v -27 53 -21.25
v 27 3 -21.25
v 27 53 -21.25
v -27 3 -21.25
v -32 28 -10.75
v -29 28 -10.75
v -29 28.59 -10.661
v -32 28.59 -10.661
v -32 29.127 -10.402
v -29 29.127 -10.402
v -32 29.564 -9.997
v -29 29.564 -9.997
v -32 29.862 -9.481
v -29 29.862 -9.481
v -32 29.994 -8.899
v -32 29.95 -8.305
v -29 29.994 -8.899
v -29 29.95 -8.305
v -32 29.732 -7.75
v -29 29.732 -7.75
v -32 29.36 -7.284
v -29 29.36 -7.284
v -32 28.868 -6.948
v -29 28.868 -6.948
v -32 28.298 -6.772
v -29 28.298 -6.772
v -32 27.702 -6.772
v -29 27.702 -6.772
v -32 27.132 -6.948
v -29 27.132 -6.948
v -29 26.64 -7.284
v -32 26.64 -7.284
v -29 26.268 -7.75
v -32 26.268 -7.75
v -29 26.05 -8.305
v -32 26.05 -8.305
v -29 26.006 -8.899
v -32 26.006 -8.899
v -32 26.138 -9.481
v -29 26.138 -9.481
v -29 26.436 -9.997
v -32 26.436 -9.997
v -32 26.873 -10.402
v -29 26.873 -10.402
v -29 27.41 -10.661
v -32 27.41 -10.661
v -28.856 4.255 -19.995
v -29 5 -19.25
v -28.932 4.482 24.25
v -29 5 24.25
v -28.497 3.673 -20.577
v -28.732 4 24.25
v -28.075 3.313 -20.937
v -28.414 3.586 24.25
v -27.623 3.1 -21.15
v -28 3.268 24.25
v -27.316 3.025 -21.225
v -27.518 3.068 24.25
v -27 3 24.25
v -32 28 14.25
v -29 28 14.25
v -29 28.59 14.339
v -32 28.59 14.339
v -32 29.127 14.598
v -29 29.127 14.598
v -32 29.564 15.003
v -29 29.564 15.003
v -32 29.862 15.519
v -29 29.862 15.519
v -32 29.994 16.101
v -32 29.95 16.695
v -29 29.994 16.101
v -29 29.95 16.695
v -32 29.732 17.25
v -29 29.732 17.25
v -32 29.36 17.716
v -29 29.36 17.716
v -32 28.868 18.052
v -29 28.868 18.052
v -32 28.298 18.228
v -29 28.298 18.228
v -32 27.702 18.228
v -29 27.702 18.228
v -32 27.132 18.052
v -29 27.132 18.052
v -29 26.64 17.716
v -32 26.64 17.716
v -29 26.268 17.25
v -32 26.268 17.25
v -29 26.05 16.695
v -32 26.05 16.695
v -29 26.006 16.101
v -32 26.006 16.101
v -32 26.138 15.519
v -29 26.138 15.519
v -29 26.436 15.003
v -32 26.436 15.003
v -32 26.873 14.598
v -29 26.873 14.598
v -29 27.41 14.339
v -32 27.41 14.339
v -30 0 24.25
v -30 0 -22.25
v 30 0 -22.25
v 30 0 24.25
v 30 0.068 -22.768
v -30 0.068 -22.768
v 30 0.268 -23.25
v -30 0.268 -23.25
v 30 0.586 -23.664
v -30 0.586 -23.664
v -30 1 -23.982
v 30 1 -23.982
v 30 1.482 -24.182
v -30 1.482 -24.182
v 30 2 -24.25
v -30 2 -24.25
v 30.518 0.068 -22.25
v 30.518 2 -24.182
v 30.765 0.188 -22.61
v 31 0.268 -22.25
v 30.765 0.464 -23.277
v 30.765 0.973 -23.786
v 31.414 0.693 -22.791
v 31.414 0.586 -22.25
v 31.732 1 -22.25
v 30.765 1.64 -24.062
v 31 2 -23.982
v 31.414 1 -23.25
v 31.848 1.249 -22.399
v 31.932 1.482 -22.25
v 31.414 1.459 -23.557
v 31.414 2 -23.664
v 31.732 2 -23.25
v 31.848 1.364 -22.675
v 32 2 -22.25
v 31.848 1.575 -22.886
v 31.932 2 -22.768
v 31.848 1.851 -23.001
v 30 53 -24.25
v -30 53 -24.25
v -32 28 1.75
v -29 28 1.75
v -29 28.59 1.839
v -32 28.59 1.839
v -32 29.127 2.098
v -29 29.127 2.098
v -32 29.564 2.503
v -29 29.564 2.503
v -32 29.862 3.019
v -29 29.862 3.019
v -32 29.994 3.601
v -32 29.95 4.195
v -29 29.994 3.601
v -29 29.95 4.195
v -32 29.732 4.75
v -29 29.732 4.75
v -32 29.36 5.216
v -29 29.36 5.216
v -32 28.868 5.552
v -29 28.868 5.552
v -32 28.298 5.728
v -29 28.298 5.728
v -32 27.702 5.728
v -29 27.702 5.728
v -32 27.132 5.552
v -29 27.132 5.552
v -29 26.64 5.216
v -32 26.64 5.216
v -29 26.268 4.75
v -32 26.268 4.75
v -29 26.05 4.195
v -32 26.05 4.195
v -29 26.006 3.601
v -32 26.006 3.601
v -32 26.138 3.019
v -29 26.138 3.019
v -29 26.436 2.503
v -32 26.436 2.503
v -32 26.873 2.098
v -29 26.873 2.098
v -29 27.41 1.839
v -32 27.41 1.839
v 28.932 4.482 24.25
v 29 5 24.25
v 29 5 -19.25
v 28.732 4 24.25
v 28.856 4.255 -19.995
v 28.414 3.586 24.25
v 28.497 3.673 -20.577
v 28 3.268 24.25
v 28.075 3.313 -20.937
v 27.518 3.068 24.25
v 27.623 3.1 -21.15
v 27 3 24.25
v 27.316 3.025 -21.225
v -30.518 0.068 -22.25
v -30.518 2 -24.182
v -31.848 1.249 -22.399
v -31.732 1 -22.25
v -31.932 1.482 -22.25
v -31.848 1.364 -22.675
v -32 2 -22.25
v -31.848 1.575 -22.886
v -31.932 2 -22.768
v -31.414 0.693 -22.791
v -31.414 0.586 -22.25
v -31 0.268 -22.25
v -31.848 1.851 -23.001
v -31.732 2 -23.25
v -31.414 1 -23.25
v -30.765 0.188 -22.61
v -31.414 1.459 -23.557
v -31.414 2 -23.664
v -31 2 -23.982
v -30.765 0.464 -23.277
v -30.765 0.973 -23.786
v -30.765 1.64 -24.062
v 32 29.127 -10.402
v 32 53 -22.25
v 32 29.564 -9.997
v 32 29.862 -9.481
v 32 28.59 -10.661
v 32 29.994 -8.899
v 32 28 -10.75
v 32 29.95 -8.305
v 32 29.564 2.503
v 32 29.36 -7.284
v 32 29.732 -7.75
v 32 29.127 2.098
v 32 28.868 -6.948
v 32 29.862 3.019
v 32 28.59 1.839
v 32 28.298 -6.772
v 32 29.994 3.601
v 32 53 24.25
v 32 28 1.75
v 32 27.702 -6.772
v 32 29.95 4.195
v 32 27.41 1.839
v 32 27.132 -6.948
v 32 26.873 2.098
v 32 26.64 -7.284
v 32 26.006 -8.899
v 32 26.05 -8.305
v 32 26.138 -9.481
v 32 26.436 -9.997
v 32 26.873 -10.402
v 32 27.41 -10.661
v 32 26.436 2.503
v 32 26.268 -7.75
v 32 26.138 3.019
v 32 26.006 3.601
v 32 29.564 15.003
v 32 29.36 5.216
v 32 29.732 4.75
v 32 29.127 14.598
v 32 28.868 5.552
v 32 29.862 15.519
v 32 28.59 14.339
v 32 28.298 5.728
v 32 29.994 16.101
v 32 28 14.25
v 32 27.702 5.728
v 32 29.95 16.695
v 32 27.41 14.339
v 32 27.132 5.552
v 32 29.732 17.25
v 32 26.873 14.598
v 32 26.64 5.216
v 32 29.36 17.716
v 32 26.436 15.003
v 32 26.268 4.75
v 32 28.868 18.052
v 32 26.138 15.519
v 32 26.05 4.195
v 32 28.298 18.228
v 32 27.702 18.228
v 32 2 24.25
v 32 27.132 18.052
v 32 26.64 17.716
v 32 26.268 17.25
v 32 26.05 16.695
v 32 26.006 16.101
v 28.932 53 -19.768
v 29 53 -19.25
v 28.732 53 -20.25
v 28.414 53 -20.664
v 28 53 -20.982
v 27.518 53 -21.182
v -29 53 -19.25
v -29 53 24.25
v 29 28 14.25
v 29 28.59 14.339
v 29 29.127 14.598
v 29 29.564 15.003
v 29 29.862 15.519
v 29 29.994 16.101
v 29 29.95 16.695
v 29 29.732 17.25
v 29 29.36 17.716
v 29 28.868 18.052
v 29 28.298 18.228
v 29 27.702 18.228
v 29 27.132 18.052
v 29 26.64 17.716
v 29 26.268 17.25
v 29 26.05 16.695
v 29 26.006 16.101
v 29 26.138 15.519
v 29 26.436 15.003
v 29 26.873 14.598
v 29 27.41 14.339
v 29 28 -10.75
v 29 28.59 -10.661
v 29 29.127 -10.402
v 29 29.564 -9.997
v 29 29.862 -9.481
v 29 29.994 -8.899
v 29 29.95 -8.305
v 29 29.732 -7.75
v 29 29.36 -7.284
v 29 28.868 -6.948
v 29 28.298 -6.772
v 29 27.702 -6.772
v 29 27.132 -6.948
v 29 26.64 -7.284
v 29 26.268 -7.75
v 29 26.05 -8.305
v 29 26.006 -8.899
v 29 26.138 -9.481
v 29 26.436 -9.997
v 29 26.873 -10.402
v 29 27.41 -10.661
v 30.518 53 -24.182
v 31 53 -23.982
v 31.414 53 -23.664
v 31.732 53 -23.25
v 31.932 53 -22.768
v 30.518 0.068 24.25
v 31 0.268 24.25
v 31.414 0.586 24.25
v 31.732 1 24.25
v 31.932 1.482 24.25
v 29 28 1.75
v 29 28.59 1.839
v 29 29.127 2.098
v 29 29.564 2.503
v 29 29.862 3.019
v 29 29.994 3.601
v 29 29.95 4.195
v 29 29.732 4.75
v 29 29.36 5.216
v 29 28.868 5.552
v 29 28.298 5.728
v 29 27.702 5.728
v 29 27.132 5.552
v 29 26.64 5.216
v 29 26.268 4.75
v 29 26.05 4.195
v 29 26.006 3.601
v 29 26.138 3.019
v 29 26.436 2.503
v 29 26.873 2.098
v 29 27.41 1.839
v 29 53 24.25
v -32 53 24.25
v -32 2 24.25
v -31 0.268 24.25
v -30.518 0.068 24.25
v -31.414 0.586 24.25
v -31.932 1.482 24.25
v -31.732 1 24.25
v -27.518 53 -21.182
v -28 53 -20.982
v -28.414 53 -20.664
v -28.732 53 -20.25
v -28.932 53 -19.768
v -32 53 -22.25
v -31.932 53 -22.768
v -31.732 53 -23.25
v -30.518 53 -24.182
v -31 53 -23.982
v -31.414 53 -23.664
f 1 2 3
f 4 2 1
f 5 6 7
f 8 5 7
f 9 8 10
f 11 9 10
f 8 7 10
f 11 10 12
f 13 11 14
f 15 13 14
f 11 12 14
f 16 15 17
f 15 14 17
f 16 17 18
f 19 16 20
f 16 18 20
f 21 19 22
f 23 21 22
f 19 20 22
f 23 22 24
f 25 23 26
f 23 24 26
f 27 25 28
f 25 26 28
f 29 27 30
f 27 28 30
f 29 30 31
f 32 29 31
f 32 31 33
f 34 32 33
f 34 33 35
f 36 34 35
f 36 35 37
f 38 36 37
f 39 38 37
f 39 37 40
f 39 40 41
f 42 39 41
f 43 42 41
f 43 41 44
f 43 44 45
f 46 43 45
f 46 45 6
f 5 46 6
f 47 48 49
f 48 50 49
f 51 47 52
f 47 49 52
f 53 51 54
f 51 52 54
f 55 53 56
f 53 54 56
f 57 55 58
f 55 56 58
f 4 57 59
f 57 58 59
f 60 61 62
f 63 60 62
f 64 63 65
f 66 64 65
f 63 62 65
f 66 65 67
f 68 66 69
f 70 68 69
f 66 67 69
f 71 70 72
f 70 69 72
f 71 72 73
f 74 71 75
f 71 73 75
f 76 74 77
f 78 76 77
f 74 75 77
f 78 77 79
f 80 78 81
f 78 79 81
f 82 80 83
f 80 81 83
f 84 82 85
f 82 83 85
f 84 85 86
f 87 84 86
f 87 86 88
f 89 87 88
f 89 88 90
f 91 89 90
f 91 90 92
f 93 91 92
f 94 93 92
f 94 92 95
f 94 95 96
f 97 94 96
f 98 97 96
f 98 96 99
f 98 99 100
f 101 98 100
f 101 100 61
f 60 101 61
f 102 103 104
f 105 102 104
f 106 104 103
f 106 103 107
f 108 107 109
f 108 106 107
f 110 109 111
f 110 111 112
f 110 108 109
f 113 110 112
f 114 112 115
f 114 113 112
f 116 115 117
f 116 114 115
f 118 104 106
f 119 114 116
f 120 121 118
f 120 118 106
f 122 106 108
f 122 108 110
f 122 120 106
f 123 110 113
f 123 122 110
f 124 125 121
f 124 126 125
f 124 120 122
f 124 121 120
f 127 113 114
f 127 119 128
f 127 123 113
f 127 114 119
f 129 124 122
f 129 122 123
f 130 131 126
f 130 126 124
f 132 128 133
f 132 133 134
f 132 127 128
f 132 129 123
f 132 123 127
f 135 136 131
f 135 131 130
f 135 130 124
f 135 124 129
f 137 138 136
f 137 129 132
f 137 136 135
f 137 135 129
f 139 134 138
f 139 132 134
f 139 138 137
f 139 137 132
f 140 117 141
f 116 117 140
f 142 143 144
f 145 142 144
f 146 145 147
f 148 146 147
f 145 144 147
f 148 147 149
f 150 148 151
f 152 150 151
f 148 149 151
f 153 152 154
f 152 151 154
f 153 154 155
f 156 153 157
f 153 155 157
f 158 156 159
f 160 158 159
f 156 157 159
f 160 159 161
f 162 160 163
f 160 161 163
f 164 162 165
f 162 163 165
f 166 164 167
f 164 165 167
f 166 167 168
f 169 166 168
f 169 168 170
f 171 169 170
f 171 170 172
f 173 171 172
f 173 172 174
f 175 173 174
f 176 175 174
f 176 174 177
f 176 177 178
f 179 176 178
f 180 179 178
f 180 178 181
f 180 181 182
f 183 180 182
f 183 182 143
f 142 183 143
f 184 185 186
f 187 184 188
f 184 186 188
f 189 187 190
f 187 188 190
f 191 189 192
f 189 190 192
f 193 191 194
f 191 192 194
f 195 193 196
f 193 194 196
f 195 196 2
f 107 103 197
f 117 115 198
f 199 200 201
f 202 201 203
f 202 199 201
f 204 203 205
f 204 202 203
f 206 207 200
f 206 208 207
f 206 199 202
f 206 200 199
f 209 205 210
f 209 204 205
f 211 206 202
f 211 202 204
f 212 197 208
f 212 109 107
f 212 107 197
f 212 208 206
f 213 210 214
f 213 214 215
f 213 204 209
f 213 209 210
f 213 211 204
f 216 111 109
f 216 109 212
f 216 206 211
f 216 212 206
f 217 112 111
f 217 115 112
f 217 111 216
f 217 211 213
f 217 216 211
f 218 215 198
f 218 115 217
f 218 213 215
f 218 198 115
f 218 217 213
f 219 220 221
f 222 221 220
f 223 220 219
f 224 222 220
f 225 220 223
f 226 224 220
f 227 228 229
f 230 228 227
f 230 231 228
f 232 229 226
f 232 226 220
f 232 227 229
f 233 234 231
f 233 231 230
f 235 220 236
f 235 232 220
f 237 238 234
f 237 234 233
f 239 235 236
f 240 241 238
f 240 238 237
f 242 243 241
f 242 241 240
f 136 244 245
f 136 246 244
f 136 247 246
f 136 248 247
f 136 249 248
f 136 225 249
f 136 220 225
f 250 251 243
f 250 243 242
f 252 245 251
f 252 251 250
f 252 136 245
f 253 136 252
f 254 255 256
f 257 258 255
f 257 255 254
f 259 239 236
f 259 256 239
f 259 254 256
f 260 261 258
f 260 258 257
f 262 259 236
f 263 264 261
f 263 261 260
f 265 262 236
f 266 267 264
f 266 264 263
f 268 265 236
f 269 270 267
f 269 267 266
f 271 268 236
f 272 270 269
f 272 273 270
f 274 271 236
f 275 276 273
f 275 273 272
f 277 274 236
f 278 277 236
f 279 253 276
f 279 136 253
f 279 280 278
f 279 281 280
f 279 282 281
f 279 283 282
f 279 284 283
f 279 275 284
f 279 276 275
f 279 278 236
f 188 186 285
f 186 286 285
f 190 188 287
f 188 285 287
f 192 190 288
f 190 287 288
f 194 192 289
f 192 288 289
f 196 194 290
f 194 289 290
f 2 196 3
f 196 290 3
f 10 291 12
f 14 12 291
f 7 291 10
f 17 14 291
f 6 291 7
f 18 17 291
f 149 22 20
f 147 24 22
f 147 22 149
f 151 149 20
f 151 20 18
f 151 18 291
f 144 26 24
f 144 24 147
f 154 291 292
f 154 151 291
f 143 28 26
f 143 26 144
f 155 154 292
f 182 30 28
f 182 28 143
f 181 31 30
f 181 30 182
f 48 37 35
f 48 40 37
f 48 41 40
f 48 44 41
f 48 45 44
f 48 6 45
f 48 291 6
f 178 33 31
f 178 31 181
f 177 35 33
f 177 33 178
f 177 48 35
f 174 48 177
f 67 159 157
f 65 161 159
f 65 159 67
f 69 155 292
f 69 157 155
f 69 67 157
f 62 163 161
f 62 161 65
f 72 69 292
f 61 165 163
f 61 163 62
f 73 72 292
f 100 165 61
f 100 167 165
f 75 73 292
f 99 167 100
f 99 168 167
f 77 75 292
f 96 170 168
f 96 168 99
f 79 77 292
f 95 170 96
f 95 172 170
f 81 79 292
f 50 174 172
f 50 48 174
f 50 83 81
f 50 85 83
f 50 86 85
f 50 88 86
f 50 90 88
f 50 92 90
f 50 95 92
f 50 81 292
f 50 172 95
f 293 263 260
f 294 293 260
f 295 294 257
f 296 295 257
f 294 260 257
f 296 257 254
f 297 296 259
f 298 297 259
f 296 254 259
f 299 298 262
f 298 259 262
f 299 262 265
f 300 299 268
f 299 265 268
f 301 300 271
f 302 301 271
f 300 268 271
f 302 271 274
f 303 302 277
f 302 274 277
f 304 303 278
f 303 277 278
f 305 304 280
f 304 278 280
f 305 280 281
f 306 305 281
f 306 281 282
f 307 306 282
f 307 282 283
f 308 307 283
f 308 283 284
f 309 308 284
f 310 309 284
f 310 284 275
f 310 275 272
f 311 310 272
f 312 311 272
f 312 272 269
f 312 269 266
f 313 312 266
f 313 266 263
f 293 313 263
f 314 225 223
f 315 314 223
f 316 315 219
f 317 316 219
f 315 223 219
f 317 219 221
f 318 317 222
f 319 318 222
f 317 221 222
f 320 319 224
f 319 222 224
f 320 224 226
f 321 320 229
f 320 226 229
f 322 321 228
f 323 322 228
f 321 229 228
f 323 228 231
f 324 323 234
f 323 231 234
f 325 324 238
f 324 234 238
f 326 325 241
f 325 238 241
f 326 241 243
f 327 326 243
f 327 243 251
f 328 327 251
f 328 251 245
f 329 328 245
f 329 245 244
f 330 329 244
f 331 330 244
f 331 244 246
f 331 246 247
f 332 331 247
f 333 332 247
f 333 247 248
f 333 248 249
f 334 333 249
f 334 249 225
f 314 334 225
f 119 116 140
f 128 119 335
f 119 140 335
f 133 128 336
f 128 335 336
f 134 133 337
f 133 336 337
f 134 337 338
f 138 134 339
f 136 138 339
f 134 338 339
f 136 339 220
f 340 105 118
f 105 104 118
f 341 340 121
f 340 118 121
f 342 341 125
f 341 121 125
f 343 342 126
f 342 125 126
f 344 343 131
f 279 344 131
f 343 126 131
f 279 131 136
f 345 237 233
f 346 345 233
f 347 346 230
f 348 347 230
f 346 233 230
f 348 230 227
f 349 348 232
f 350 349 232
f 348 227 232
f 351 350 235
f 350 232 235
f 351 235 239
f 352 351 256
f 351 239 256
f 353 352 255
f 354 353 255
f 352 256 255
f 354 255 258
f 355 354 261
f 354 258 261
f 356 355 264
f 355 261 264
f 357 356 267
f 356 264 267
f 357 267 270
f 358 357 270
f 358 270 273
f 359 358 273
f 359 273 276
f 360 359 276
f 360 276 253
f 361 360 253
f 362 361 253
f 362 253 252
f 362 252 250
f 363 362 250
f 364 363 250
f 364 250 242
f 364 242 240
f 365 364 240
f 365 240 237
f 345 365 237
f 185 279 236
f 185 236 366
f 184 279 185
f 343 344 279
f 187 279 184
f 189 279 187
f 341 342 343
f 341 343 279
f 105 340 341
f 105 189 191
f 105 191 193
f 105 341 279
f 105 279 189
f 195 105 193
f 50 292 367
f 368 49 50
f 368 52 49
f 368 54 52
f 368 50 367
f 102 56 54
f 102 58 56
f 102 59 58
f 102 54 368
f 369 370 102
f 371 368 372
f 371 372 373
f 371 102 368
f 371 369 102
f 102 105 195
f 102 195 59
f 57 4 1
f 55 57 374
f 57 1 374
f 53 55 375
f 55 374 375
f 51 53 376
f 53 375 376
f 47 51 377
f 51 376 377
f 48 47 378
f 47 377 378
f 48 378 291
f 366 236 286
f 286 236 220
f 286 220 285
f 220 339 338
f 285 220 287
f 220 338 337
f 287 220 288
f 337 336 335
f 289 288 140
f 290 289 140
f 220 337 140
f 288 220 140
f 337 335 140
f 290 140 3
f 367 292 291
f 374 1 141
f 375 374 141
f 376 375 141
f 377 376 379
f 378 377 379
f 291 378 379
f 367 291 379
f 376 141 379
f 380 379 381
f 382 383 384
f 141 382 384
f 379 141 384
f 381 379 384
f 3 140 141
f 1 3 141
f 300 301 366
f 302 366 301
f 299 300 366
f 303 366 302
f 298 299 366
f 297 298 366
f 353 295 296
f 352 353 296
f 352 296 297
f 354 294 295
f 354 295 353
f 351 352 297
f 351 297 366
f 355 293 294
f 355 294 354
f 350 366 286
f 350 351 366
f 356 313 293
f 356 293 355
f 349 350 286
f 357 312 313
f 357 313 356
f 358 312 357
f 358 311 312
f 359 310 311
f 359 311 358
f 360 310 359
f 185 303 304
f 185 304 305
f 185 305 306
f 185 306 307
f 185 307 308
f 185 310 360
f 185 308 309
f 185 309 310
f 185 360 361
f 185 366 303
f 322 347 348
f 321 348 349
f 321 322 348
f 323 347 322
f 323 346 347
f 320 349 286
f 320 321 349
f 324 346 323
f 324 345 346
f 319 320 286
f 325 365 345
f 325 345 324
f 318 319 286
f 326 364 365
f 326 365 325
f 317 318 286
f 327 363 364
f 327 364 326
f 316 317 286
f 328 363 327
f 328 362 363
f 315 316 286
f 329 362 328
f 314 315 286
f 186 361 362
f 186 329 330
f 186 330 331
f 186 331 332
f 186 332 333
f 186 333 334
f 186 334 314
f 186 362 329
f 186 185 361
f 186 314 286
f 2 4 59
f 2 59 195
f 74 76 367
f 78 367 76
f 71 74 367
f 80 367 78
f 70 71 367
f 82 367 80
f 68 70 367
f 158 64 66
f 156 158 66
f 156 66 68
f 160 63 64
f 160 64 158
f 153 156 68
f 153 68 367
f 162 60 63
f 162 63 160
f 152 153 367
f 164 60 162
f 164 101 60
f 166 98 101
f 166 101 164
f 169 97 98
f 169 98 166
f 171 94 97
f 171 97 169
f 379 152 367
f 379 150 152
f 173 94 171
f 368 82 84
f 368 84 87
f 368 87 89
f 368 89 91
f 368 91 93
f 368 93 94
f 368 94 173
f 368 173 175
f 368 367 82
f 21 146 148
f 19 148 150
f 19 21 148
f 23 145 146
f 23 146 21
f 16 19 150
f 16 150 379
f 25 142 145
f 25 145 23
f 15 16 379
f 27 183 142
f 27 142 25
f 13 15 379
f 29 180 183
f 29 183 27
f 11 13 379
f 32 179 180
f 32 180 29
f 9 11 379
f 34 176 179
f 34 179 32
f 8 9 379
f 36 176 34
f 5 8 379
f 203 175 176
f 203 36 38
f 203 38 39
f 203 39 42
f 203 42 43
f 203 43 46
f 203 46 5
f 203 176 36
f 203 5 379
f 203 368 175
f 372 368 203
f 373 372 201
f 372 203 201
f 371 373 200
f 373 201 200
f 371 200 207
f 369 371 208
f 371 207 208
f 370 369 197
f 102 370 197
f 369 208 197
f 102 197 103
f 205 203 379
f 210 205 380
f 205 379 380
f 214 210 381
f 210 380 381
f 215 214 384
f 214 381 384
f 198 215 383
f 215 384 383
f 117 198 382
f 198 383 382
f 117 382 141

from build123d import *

# Parameters (mm, degrees)
SKETCH_1_W          = 64
SKETCH_1_H          = 48.5
EXTRUDE_1_DEPTH     = 3
EXTRUDE_2_DEPTH     = 50
FILLET_2_R          = 2
SKETCH_3_R          = 2
CUT_EXTRUDE_1_DEPTH = 65
FILLET_3_R          = 2


with BuildPart() as part:
    # Эскиз1 → Бобышка-Вытянуть1 (new body)
    with BuildSketch(Plane(origin=(0, 0, 0), x_dir=(1, 0, 0), z_dir=(0, 1, 0))):
        Rectangle(SKETCH_1_W, SKETCH_1_H)
    extrude(amount=EXTRUDE_1_DEPTH)

    # Эскиз2 → Бобышка-Вытянуть2 (add)
    with BuildSketch(Plane(origin=(0, 3, 0), x_dir=(1, 0, 0), z_dir=(0, 1, 0))):
        Polygon((-32, -24.25), (-32, 24.25), (32, 24.25), (32, -24.25), (29, -24.25), (29, 21.25), (-29, 21.25), (-29, -24.25), align=None)
    extrude(amount=EXTRUDE_2_DEPTH)

    # Скругление2
    fillet_2_edges = [part.edges().sort_by_distance(p)[0] for p in [
        (0, 0, -24.25),
    ]]
    fillet(fillet_2_edges, radius=FILLET_2_R)

    # Эскиз3 → Вырез-Вытянуть1 (cut, through all)
    with BuildSketch(Plane(origin=(32, 0, 0), x_dir=(0, 0, -1), z_dir=(1, 0, 0))):
        with Locations((8.75, 28)):
            Circle(SKETCH_3_R)
        with Locations((-3.75, 28)):
            Circle(SKETCH_3_R)
        with Locations((-16.25, 28)):
            Circle(SKETCH_3_R)
    extrude(amount=-CUT_EXTRUDE_1_DEPTH, mode=Mode.SUBTRACT)

    # Скругление3
    fillet_3_edges = [part.edges().sort_by_distance(p)[0] for p in [
        (-29, 3, 1.5),
        (-29, 28, -21.25),
        (29, 3, 1.5),
        (29, 28, -21.25),
        (-32, 0, 1),
        (-32, 0.585786438, -23.664213562),
        (32, 0.585786438, -23.664213562),
        (32, 0, 1),
        (-32, 27.5, -24.25),
        (32, 27.5, -24.25),
    ]]
    fillet(fillet_3_edges, radius=FILLET_3_R)


solid = part.part
